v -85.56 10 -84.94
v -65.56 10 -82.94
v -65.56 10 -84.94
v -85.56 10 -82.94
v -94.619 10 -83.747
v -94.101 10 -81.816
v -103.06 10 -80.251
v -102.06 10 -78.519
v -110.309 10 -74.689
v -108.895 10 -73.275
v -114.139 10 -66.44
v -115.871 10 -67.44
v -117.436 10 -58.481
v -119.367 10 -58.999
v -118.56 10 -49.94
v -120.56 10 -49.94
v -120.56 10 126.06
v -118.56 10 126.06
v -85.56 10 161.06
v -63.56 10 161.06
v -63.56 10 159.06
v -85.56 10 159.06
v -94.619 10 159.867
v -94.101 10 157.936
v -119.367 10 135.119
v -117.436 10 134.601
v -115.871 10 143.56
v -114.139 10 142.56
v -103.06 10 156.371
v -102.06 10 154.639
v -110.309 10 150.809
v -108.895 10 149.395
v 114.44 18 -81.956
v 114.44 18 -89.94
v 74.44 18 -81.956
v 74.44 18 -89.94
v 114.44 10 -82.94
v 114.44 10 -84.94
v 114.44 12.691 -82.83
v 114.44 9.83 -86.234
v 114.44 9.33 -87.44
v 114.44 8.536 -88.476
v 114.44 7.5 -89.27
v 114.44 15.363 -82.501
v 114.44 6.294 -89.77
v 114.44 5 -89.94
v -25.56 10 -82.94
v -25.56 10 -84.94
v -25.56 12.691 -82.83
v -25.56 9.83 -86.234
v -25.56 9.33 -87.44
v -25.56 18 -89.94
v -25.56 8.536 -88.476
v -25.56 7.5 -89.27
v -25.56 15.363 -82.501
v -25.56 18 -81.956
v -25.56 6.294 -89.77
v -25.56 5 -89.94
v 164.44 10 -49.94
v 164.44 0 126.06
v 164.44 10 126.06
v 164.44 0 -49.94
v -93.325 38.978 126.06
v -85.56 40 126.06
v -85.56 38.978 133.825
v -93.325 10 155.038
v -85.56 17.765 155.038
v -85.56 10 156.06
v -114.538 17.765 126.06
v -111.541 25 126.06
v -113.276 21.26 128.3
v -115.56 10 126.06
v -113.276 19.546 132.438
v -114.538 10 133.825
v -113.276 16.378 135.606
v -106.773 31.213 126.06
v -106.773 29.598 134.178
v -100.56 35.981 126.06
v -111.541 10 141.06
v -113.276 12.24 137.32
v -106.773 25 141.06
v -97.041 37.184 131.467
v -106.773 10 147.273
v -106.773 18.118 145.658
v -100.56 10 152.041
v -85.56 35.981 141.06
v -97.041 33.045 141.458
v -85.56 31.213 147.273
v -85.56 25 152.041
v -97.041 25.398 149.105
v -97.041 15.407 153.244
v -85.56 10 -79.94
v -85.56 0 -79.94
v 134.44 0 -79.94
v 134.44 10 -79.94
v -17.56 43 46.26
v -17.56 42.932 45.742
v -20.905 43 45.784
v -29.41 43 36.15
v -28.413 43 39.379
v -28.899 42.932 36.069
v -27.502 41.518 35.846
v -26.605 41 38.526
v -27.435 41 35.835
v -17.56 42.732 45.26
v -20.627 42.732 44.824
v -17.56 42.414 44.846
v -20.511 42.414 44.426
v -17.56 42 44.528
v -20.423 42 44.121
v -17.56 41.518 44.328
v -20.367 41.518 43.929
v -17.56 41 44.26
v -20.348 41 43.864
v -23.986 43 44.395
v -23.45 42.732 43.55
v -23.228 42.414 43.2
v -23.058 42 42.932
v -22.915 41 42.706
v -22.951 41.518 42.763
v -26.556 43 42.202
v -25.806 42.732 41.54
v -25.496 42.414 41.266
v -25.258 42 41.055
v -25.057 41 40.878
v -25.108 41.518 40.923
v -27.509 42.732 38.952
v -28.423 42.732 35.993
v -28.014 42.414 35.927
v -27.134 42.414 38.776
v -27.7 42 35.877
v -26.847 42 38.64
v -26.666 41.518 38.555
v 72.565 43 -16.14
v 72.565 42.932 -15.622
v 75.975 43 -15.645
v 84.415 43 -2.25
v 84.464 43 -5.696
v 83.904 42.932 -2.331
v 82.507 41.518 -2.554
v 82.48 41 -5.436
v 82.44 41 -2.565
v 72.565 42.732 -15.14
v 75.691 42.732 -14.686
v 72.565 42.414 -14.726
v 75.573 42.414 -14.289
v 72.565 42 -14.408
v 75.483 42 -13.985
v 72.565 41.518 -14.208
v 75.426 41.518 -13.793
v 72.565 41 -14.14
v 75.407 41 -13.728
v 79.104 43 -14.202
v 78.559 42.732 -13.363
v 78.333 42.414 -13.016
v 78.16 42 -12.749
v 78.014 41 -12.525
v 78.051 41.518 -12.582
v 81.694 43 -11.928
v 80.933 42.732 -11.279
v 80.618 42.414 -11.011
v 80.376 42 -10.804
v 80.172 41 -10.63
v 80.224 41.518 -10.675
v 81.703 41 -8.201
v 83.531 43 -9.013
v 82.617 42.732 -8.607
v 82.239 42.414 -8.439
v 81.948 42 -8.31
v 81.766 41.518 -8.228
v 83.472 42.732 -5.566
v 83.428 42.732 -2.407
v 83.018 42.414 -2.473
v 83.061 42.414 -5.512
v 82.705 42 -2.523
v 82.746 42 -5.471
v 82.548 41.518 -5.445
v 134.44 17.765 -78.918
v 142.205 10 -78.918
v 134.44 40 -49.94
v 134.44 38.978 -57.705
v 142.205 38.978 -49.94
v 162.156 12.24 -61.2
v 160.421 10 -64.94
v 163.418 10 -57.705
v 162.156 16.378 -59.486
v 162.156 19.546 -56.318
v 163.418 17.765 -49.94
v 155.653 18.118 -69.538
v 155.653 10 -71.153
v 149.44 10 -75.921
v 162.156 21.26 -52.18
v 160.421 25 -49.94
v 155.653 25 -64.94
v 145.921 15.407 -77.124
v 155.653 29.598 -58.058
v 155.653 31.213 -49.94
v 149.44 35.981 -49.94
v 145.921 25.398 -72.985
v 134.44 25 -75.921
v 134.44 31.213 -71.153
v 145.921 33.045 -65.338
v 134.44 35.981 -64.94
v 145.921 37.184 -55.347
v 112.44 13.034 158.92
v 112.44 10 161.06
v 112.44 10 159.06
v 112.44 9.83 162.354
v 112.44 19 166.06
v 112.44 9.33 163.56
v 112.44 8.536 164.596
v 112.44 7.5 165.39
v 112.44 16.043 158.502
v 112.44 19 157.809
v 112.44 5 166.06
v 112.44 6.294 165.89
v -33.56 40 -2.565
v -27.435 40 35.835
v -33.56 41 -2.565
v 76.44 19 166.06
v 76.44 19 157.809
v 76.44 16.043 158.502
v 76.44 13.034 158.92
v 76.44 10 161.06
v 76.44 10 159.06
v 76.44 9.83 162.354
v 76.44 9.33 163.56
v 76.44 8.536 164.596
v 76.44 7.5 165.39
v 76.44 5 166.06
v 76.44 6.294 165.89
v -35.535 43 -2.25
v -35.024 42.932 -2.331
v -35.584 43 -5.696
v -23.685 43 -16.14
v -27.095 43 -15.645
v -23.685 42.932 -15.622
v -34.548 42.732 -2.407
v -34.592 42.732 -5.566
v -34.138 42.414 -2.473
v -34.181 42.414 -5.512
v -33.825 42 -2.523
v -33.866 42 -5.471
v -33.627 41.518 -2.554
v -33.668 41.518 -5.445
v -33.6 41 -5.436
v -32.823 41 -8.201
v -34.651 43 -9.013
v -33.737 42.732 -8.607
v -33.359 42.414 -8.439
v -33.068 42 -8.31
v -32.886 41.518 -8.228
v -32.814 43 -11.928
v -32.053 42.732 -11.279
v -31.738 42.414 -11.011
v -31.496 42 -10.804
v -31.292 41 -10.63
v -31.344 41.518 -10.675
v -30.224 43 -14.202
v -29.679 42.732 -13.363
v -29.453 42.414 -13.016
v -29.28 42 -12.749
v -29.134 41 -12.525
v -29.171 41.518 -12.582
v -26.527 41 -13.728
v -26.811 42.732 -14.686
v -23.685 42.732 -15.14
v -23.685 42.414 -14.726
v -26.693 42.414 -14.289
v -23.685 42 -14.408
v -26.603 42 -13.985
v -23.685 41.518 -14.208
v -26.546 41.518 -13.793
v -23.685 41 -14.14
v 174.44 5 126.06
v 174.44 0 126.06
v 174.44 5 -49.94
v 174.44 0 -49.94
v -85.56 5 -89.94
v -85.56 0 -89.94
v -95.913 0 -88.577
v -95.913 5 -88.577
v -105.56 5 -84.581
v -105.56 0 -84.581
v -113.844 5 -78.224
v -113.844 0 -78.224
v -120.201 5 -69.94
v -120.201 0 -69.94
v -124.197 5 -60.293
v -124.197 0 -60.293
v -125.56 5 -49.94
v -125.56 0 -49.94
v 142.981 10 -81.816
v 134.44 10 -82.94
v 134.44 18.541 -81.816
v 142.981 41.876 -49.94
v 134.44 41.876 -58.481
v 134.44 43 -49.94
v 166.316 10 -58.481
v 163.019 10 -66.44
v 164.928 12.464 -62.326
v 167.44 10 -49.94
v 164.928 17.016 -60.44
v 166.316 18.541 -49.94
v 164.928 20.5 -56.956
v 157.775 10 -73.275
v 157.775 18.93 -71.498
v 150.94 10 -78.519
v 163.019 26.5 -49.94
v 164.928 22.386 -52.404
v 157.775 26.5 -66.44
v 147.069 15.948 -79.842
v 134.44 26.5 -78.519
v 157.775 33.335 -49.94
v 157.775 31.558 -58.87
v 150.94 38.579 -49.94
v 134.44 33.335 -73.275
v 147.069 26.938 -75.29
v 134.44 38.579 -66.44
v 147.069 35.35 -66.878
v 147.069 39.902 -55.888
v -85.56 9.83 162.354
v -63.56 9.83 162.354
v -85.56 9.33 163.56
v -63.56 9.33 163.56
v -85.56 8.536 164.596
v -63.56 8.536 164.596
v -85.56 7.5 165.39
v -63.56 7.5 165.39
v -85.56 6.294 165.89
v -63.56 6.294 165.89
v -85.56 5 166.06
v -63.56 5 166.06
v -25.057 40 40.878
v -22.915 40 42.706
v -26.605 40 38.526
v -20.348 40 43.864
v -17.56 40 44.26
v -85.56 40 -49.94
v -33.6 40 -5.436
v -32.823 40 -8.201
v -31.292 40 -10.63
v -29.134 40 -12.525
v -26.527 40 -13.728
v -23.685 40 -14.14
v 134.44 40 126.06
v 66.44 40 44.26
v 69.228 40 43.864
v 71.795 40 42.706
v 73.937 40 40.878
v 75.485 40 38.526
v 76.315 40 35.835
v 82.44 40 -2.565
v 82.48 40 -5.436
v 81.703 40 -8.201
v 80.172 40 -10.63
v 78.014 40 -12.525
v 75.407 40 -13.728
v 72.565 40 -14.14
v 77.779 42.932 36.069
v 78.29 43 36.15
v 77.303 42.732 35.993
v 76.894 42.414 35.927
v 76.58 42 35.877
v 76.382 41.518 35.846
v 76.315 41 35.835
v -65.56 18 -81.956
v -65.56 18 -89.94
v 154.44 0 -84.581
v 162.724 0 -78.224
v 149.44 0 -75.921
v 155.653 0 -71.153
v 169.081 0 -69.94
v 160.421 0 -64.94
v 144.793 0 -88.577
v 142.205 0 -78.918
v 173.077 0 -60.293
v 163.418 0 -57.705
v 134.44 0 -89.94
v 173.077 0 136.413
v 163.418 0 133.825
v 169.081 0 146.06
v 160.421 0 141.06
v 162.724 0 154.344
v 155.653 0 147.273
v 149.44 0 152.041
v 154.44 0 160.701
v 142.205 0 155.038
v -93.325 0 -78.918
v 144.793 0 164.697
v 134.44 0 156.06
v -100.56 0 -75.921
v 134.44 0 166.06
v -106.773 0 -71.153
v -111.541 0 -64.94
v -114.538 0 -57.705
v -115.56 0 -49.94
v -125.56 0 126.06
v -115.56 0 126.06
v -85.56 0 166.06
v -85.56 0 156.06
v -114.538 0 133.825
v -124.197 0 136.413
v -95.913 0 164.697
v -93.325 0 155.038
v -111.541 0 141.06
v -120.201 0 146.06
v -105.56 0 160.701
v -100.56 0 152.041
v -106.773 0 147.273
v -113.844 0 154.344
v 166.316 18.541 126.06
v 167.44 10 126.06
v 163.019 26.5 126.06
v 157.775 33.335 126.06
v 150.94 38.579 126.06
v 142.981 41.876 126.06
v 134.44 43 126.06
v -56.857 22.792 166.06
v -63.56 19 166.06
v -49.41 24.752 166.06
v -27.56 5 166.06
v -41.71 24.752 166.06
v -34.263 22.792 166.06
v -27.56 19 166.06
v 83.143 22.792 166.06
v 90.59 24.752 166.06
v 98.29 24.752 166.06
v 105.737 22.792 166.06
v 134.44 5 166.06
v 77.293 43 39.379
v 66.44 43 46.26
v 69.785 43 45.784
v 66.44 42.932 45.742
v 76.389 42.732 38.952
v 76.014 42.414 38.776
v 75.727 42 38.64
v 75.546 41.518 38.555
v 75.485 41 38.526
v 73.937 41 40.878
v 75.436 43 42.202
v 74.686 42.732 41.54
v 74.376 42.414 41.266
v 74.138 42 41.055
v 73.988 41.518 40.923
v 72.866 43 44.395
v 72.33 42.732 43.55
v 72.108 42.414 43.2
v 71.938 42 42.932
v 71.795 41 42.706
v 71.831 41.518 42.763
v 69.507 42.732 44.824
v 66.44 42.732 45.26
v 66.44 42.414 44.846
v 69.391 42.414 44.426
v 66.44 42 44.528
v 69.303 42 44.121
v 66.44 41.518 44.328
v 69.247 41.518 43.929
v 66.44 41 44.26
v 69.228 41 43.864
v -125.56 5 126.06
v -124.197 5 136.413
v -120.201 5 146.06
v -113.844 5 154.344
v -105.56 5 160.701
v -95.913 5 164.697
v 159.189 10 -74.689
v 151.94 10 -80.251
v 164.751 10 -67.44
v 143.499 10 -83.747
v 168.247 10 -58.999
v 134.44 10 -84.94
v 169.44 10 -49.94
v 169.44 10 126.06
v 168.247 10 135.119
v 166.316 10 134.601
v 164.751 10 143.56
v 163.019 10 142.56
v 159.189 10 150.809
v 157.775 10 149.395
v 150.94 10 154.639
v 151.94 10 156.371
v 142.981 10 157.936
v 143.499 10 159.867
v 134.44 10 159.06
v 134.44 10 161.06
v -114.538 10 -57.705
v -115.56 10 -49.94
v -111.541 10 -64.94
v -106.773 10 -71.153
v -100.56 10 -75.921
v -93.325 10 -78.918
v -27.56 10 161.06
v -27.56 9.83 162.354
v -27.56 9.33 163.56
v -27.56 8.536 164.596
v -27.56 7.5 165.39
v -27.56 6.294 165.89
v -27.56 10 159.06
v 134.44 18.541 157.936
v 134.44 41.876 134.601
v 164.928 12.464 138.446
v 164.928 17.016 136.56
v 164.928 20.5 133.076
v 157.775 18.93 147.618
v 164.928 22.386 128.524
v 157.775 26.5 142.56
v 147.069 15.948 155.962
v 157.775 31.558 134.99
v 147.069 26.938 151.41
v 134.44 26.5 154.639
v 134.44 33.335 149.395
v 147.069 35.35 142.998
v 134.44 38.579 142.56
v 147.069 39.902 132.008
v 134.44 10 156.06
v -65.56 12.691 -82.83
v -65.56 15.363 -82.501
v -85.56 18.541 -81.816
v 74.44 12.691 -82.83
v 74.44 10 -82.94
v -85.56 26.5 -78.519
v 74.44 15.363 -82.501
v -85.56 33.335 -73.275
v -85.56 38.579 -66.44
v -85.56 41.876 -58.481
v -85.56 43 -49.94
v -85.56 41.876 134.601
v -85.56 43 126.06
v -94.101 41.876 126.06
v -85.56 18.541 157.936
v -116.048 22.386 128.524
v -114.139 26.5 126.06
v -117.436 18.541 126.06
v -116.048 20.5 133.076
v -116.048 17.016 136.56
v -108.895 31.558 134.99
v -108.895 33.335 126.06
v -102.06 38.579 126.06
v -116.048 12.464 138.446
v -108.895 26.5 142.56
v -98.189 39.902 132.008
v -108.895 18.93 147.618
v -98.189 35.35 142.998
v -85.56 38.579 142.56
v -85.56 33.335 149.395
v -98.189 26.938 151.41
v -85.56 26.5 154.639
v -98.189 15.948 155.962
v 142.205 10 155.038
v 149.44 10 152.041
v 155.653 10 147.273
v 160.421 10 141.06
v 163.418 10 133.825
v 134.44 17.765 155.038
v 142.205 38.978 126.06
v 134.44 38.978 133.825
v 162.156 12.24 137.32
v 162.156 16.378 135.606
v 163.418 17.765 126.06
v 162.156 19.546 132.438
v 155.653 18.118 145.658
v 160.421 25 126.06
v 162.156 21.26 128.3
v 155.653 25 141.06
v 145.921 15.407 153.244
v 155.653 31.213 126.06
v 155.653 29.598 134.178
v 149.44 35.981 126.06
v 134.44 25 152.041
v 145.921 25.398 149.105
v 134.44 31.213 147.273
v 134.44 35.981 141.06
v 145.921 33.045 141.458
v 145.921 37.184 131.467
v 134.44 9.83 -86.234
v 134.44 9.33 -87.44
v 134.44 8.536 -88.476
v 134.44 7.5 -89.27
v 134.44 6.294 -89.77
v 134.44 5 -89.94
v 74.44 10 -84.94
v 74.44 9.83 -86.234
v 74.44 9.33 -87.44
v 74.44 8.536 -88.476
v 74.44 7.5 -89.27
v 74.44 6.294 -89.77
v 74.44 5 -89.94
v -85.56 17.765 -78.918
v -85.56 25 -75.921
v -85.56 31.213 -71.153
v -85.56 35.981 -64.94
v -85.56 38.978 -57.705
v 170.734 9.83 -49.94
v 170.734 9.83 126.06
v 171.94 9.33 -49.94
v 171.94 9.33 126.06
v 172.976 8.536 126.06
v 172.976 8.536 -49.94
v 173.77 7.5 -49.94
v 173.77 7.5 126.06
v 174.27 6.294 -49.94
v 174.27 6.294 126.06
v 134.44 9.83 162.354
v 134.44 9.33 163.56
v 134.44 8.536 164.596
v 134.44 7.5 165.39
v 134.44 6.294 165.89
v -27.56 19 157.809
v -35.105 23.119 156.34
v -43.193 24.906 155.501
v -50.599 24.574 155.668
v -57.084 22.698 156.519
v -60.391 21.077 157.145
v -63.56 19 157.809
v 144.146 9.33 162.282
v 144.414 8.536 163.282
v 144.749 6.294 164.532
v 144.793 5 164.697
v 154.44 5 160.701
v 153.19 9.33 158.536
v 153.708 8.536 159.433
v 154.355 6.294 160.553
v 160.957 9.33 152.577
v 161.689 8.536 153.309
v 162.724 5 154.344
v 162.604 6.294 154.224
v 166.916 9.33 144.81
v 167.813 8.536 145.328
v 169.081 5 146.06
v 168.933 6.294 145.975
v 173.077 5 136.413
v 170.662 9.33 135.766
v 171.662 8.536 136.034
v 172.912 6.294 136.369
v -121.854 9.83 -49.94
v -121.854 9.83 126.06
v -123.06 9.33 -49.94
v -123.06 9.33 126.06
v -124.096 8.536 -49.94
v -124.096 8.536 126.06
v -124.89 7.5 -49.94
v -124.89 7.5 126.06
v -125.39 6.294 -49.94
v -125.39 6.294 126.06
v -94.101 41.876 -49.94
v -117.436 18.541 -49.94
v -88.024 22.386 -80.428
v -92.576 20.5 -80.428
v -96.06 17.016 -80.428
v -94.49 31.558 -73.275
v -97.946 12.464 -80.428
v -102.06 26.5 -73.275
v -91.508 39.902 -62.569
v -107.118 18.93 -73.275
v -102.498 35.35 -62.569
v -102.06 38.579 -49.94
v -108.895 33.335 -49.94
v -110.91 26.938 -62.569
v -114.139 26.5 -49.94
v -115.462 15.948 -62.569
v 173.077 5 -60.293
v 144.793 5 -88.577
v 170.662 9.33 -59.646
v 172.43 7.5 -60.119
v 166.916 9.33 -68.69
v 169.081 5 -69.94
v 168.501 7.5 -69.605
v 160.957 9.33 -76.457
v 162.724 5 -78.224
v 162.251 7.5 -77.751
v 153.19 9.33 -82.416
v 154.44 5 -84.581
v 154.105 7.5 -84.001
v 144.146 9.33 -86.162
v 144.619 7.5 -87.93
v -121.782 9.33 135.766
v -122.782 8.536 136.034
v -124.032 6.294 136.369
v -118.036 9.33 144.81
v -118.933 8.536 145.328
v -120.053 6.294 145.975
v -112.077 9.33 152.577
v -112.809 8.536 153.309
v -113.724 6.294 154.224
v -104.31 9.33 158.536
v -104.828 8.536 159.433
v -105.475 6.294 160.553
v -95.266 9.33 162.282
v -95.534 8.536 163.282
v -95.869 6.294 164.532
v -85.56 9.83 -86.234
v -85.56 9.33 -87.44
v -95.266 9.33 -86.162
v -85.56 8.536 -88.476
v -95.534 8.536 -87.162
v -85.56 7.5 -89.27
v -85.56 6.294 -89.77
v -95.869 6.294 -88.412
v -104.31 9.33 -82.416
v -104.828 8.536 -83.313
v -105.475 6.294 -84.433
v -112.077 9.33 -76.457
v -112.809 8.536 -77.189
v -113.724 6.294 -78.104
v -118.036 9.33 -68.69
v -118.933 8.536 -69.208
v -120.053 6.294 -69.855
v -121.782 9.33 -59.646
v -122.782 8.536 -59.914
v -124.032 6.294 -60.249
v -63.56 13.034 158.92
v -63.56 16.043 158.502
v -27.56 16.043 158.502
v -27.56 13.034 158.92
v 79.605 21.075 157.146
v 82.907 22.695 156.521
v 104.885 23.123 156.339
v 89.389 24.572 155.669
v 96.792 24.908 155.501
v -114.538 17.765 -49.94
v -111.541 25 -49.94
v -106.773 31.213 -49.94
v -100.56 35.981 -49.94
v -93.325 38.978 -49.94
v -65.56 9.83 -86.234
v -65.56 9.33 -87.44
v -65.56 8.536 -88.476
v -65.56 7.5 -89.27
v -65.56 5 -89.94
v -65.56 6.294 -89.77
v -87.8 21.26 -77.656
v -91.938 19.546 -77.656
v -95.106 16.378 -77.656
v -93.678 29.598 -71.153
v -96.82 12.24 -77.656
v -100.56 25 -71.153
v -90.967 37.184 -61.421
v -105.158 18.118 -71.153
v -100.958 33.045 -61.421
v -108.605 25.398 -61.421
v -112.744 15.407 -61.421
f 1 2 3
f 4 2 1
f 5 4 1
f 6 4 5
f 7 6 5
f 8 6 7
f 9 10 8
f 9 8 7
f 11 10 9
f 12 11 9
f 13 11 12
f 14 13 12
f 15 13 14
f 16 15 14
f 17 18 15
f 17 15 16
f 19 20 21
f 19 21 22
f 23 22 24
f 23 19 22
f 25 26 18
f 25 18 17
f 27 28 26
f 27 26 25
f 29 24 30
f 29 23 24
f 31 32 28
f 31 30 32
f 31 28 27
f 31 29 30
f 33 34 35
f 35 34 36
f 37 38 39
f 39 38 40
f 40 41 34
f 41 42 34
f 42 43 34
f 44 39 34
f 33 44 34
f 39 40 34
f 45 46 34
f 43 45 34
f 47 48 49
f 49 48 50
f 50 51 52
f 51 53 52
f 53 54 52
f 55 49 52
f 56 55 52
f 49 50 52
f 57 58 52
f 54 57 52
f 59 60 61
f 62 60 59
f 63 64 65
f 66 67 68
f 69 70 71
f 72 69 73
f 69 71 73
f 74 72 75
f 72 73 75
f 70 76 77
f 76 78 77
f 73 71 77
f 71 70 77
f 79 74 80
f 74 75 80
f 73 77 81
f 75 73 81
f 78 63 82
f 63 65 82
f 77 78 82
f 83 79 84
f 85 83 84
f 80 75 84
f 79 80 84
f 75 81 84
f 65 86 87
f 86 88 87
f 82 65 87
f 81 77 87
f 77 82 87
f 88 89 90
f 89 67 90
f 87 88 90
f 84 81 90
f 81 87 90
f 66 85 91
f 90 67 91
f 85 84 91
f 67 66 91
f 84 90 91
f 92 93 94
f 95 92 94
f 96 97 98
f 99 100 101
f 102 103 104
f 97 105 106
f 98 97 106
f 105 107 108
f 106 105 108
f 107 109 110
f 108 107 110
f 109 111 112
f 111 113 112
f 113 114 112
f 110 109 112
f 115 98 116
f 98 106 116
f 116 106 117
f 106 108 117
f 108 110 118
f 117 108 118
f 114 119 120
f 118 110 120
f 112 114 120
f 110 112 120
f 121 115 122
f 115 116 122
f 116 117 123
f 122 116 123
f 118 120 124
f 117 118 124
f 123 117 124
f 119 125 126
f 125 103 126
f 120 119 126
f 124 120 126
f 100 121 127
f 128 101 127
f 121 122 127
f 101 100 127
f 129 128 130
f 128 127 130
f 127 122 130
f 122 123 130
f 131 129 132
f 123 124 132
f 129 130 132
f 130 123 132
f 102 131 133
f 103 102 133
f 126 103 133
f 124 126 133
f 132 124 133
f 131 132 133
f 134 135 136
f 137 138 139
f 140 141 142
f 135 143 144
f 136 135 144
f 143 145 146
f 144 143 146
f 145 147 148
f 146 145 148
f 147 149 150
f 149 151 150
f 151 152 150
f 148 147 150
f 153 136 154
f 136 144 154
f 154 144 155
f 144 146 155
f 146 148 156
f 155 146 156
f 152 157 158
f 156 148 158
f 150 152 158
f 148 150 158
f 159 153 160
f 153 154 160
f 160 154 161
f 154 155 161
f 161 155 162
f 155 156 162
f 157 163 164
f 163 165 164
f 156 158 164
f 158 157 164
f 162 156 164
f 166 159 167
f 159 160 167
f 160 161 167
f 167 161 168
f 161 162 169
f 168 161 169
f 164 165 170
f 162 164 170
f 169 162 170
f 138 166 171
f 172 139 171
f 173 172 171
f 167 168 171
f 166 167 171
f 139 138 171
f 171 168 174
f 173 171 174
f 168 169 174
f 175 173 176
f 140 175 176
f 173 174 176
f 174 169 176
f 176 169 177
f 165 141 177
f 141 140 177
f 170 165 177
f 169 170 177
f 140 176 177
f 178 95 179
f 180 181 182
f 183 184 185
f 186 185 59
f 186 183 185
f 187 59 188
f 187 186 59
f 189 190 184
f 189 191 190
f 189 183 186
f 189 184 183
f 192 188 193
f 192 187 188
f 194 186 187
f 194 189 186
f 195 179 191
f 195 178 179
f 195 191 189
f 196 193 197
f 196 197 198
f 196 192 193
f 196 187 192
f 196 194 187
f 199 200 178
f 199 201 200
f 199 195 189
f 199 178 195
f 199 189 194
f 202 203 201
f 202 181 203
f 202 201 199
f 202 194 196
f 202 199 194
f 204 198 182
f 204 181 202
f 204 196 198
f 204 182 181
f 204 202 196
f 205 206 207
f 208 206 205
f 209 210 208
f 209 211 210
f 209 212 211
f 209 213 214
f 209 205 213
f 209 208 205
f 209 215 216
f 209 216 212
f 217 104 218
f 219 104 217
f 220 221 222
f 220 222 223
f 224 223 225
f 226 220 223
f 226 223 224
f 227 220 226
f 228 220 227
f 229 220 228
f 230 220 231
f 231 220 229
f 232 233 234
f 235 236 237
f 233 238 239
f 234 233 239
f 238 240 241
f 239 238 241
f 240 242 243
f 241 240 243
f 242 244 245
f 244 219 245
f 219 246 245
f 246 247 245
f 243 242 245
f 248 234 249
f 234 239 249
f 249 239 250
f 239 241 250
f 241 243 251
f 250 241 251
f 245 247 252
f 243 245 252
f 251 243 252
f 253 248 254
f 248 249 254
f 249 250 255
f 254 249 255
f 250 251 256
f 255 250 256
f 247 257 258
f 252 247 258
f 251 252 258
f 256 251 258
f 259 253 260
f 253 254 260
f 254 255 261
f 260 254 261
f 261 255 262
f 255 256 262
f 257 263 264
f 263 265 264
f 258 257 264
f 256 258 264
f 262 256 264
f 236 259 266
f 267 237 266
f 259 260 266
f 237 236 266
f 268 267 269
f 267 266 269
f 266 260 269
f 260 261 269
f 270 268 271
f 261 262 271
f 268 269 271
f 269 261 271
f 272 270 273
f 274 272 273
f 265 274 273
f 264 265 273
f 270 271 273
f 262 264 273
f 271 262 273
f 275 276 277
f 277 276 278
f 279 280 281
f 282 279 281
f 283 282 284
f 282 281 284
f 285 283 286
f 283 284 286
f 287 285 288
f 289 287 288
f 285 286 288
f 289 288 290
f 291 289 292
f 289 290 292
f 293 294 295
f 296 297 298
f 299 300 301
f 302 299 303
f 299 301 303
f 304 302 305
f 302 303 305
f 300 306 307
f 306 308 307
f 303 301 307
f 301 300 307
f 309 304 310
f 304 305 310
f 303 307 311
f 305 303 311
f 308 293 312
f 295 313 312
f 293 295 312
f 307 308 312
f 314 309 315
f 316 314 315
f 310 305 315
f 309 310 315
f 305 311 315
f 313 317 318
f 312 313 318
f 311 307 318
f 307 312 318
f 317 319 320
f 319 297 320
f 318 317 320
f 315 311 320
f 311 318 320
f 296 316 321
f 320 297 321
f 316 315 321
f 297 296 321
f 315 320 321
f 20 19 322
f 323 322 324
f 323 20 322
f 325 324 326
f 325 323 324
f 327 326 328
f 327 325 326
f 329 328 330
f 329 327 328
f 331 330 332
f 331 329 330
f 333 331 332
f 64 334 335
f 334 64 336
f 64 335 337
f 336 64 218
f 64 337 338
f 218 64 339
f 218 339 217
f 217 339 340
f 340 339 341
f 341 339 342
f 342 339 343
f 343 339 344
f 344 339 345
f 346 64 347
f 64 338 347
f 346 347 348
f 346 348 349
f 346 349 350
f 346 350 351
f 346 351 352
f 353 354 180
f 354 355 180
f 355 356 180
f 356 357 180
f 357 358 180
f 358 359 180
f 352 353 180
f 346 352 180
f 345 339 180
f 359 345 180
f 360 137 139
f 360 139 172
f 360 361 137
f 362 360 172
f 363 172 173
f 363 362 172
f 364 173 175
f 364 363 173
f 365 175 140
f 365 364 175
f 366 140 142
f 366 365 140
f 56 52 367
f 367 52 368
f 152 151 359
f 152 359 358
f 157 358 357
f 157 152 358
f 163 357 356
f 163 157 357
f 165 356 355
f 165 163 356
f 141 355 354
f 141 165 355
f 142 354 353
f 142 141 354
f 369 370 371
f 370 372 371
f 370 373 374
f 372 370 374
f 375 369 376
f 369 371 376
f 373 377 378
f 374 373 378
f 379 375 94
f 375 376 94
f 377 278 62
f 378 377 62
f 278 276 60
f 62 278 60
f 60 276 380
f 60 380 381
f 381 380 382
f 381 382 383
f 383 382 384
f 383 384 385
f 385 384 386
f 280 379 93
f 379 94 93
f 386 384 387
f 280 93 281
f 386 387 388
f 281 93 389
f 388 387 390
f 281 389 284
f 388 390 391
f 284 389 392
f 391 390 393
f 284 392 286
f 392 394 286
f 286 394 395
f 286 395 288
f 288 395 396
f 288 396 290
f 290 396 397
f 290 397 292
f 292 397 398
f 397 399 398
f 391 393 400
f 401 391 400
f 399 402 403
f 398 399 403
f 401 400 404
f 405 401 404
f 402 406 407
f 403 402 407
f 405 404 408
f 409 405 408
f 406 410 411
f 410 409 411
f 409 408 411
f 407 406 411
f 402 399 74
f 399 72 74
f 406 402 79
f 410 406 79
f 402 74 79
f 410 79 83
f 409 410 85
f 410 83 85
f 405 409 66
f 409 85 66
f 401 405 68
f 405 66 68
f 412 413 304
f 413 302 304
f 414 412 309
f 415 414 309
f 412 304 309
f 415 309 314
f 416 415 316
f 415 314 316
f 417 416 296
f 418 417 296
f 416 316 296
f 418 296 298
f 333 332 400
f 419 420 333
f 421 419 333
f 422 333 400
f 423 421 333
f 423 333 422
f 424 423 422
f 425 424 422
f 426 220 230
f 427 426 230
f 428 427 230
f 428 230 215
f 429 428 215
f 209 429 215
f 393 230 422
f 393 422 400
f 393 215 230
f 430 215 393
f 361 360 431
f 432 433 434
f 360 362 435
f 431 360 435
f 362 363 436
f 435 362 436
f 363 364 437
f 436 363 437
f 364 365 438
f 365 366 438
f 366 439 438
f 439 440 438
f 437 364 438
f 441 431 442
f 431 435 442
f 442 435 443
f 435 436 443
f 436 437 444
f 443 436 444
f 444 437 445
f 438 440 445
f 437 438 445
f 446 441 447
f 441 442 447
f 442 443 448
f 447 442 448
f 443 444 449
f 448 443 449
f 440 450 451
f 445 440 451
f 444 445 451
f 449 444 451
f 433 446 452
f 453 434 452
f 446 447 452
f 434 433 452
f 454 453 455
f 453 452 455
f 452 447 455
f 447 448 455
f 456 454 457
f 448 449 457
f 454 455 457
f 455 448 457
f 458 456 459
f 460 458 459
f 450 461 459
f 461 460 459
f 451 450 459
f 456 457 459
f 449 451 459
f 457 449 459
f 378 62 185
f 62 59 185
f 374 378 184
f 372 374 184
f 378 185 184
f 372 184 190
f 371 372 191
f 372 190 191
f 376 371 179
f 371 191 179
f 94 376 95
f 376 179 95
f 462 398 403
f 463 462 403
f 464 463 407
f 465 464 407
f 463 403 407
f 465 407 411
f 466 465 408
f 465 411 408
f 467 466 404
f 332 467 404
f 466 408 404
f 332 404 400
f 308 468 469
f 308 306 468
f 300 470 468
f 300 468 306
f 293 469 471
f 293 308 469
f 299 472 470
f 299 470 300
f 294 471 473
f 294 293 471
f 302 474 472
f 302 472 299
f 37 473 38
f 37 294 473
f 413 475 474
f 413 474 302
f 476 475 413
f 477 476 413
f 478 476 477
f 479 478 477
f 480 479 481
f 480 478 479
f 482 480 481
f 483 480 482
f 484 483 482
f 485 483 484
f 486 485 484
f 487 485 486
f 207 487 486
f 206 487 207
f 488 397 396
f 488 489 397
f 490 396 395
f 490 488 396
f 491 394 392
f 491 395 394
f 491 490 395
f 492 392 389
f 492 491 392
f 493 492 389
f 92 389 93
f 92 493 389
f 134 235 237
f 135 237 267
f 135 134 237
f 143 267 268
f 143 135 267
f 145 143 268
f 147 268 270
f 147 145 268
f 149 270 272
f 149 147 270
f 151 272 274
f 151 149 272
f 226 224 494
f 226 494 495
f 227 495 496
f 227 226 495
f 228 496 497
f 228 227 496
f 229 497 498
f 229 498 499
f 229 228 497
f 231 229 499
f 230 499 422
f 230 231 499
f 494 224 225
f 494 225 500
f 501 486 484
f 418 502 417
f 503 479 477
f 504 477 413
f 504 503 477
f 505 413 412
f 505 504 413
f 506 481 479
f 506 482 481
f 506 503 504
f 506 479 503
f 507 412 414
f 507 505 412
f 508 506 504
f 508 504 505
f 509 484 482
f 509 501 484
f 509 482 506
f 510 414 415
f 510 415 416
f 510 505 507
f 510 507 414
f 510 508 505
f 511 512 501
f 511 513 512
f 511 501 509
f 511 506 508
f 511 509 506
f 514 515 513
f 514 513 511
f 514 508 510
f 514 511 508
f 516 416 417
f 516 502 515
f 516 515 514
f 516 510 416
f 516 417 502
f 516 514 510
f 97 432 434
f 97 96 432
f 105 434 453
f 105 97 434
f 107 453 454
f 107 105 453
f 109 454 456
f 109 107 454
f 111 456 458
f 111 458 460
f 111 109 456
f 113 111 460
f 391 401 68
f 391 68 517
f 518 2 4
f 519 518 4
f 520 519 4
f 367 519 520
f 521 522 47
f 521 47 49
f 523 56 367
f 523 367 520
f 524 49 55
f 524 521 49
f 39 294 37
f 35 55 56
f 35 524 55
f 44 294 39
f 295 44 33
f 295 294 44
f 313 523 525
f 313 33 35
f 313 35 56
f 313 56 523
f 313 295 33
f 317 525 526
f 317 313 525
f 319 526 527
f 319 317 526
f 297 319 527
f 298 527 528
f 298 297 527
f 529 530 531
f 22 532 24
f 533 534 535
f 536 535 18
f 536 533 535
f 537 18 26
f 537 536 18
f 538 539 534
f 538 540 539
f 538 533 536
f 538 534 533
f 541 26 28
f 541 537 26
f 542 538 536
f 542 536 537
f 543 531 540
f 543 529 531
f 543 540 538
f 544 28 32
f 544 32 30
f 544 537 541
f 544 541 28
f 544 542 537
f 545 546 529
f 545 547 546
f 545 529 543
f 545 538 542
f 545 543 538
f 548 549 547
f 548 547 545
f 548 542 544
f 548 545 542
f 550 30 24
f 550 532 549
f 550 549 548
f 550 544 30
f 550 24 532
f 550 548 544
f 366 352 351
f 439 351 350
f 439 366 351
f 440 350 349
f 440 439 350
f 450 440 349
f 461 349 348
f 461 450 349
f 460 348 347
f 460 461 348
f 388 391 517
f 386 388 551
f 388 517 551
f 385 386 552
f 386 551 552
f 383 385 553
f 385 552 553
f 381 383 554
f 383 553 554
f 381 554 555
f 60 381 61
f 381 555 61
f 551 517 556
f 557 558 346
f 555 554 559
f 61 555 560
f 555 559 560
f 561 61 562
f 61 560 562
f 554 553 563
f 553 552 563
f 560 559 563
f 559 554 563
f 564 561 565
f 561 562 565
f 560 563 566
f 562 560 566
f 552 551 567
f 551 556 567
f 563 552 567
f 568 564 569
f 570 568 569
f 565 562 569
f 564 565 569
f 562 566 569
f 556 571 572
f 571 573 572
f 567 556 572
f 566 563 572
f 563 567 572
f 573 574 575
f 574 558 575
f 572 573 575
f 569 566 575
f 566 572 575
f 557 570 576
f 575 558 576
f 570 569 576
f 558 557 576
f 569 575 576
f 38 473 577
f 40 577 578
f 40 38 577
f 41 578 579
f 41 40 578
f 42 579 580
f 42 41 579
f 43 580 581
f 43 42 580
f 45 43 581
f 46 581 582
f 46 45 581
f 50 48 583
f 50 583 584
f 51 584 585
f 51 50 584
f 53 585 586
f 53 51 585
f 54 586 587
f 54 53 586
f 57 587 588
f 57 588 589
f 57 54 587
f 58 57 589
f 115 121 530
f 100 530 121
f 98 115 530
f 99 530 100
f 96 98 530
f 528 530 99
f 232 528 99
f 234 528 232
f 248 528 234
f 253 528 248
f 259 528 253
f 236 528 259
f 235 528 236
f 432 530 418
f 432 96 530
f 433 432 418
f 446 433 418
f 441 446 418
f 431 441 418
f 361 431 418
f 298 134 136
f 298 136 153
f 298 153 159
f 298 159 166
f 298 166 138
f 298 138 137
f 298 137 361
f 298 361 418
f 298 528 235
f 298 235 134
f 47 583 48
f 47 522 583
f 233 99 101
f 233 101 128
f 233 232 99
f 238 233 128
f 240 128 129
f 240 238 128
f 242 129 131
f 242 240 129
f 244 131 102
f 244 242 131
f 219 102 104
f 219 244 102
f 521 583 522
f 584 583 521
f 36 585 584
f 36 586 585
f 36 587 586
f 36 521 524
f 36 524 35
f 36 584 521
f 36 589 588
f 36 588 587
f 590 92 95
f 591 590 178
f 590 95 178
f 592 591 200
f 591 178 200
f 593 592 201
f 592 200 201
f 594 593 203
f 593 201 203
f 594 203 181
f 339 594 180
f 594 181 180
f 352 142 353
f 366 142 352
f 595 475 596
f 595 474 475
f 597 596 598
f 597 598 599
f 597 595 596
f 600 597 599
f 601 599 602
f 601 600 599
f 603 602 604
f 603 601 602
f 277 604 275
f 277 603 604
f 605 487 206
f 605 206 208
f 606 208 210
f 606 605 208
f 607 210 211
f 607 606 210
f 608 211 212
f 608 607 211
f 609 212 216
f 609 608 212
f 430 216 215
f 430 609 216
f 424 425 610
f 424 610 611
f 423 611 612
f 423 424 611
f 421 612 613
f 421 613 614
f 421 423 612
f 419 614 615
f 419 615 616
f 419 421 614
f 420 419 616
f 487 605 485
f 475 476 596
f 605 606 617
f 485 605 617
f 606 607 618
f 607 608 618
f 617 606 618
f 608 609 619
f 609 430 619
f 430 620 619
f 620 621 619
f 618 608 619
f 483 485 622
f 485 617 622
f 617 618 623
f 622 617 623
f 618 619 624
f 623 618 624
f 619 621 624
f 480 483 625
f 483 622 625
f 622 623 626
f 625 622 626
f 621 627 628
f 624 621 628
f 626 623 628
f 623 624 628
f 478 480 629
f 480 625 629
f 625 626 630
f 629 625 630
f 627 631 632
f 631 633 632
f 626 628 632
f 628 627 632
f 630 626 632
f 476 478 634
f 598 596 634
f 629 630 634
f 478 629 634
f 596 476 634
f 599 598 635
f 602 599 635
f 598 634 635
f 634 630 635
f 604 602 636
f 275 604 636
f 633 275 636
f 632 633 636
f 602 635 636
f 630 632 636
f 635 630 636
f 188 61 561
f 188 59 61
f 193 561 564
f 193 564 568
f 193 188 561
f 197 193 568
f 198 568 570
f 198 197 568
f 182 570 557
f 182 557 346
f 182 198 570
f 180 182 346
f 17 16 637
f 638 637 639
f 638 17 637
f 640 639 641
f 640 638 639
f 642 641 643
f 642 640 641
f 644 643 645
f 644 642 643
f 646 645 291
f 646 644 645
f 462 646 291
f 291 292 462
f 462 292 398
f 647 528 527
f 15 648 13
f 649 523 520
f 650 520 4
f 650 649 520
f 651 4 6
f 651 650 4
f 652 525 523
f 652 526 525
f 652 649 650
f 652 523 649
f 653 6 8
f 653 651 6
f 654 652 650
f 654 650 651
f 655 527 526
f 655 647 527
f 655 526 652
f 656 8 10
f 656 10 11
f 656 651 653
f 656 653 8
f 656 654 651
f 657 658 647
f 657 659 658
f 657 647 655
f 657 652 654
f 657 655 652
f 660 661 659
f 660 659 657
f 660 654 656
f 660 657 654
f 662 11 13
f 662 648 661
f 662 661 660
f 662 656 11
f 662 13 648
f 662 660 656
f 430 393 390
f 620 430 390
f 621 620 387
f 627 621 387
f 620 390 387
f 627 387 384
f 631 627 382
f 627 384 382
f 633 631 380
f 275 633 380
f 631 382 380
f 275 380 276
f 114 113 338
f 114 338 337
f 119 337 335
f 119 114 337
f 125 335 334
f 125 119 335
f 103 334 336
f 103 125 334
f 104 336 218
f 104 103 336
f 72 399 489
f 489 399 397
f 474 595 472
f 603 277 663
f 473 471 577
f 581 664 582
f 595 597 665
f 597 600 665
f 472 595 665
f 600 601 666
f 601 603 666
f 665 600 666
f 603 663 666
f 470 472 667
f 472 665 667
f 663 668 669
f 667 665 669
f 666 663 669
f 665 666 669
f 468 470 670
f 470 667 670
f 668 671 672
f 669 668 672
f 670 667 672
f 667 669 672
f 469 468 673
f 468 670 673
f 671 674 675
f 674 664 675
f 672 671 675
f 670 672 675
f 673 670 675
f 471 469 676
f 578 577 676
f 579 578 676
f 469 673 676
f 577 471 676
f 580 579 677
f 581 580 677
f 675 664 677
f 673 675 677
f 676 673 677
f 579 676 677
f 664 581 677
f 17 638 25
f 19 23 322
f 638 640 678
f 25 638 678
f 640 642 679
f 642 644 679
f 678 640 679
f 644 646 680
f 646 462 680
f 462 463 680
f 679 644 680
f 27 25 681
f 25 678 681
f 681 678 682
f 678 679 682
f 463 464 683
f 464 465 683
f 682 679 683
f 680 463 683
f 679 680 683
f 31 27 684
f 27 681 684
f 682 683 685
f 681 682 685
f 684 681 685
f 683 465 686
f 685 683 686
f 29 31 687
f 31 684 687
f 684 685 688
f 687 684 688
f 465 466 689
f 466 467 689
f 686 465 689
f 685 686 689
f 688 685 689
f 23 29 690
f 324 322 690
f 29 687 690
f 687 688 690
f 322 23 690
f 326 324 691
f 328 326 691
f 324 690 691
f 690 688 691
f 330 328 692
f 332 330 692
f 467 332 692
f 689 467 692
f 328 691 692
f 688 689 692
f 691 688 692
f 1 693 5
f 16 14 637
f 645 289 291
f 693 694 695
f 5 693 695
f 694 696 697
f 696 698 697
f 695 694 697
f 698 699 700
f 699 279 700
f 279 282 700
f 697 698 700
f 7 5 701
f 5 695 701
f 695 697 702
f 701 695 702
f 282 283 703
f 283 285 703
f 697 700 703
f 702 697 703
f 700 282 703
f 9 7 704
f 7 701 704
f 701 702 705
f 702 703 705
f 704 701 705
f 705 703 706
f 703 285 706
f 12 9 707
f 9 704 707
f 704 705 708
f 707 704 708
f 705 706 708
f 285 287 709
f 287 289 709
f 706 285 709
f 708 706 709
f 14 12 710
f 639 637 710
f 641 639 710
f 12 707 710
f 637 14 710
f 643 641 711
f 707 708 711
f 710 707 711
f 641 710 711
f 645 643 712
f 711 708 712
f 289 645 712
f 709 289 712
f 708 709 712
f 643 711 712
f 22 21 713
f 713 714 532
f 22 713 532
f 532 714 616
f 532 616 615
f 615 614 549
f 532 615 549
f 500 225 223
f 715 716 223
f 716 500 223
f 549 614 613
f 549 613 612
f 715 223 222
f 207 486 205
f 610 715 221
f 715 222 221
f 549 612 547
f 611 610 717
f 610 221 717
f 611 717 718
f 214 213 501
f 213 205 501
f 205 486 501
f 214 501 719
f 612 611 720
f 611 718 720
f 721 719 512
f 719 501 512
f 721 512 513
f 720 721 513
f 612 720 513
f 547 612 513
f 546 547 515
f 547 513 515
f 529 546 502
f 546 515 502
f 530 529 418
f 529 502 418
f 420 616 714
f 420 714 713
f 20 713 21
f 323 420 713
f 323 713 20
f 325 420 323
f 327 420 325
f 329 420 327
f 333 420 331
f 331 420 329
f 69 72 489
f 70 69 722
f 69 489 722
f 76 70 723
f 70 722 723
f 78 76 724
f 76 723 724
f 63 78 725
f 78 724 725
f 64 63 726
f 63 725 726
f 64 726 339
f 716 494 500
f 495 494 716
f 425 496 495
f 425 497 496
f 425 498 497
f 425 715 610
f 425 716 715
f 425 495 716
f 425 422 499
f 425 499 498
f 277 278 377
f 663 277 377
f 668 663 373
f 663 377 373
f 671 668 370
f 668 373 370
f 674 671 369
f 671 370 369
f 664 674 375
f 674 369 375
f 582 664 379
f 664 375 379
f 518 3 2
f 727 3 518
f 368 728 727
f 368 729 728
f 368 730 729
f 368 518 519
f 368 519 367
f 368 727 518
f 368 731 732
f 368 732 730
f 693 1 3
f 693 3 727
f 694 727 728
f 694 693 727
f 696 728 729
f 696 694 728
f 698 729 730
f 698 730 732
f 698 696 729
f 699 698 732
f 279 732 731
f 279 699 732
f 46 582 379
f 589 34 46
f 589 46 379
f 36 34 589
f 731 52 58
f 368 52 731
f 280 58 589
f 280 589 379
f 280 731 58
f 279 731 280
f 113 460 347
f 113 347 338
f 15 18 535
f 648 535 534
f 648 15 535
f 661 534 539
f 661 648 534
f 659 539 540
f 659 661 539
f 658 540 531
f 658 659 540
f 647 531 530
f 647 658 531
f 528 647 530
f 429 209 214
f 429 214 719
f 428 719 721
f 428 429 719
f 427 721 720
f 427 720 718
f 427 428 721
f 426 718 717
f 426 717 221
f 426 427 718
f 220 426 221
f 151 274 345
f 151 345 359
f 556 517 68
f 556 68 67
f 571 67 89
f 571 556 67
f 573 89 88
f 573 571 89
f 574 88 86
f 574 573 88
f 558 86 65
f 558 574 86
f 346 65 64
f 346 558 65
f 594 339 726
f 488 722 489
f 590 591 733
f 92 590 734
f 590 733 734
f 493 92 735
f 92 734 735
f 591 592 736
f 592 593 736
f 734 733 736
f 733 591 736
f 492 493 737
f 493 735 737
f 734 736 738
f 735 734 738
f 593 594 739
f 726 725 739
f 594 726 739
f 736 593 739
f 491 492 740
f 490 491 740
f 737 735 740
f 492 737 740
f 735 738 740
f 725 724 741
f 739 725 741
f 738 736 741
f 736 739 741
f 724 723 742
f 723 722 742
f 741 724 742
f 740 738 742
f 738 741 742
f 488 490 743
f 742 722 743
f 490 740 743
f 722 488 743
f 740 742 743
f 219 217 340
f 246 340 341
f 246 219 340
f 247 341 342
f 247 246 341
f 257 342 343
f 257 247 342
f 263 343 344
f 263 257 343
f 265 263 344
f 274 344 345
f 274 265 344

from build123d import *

# Parameters (mm, degrees)
SKETCH1_W           = 286
SKETCH1_H           = 242
BOSS_EXTRUDE1_DEPTH = 43
FILLET1_R           = 33
SHELL1_T            = -3
BOSS_EXTRUDE2_DEPTH = 10
FILLET2_R           = 5
CUT_EXTRUDE2_DEPTH  = 245.651256349
FILLET3_R           = 2
BOSS_EXTRUDE3_REACH = 314.753
SKETCH5_W           = 40
SKETCH5_H           = 18
BOSS_EXTRUDE4_REACH = 314.753


with BuildPart() as part:
    # Sketch1 → Boss-Extrude1 (new body)
    with BuildSketch(Plane(origin=(0, 0, 0), x_dir=(1, 0, 0), z_dir=(0, 1, 0))):
        with Locations((24.44, -38.06)):
            Rectangle(SKETCH1_W, SKETCH1_H)
    extrude(amount=BOSS_EXTRUDE1_DEPTH)

    # Fillet1
    fillet1_edges = [part.edges().sort_by_distance(p)[0] for p in [
        (24.44, 43, 159.06),
        (-118.56, 43, 38.06),
        (24.44, 43, -82.94),
        (-118.56, 21.5, -82.94),
        (-118.56, 21.5, 159.06),
        (167.44, 21.5, 159.06),
        (167.44, 21.5, -82.94),
        (167.44, 43, 38.06),
    ]]
    fillet(fillet1_edges, radius=FILLET1_R)

    # Shell1
    shell1_openings = [part.faces().sort_by_distance(p)[0] for p in [
        (24.44, 0, 38.06),
    ]]
    offset(amount=SHELL1_T, openings=shell1_openings, kind=Kind.INTERSECTION)

    # Sketch2 → Boss-Extrude2 (add)
    with BuildSketch(Plane.XZ):
        with BuildLine():
            Line((-85.56, 166.06), (134.44, 166.06))
            ThreePointArc((134.44, 166.06), (162.724271247, 154.344271247), (174.44, 126.06))
            Line((174.44, 126.06), (174.44, -49.94))
            ThreePointArc((174.44, -49.94), (162.724271247, -78.224271247), (134.44, -89.94))
            Line((134.44, -89.94), (-85.56, -89.94))
            ThreePointArc((-85.56, -89.94), (-113.844271247, -78.224271247), (-125.56, -49.94))
            Line((-125.56, -49.94), (-125.56, 126.06))
            ThreePointArc((-125.56, 126.06), (-113.844271247, 154.344271247), (-85.56, 166.06))
        make_face()
        with BuildLine():
            Line((-85.56, 159.06), (134.44, 159.06))
            ThreePointArc((134.44, 159.06), (157.774523779, 149.394523779), (167.44, 126.06))
            Line((167.44, 126.06), (167.44, -49.94))
            ThreePointArc((167.44, -49.94), (157.774523779, -73.274523779), (134.44, -82.94))
            Line((134.44, -82.94), (-85.56, -82.94))
            ThreePointArc((-85.56, -82.94), (-108.894523779, -73.274523779), (-118.56, -49.94))
            Line((-118.56, -49.94), (-118.56, 126.06))
            ThreePointArc((-118.56, 126.06), (-108.894523779, 149.394523779), (-85.56, 159.06))
        make_face(mode=Mode.SUBTRACT)
    extrude(amount=-BOSS_EXTRUDE2_DEPTH)

    # Fillet2
    fillet2_edges = [part.edges().sort_by_distance(p)[0] for p in [
        (162.724271247, 10, -78.224271247),
        (24.44, 10, -89.94),
        (-113.844271247, 10, -78.224271247),
        (-125.56, 10, 38.06),
        (-113.844271247, 10, 154.344271247),
        (24.44, 10, 166.06),
        (162.724271247, 10, 154.344271247),
        (174.44, 10, 38.06),
    ]]
    fillet(fillet2_edges, radius=FILLET2_R)

    # Sketch4 → Cut-Extrude2 (cut, through all)
    with BuildSketch(Plane(origin=(0, 43, 0), x_dir=(1, 0, 0), z_dir=(0, 1, 0))):
        with BuildLine():
            Line((-23.684825583, 14.14), (72.564825583, 14.14))
            ThreePointArc((72.564825583, 14.14), (80.172419453, 10.630340169), (82.44, 2.564903101))
            Line((82.44, 2.564903101), (76.315174417, -35.835096899))
            ThreePointArc((76.315174417, -35.835096899), (72.930340169, -41.86759387), (66.44, -44.26))
            Line((66.44, -44.26), (-17.56, -44.26))
            ThreePointArc((-17.56, -44.26), (-24.050340169, -41.86759387), (-27.435174417, -35.835096899))
            Line((-27.435174417, -35.835096899), (-33.56, 2.564903101))
            ThreePointArc((-33.56, 2.564903101), (-31.292419453, 10.630340169), (-23.684825583, 14.14))
        make_face()
    extrude(amount=-CUT_EXTRUDE2_DEPTH, mode=Mode.SUBTRACT)

    # Fillet3
    fillet3_edges = [part.edges().sort_by_distance(p)[0] for p in [
        (-24.050340169, 43, 41.86759387),
        (24.44, 43, 44.26),
        (72.930340169, 43, 41.86759387),
        (79.377587208, 43, 16.635096899),
        (80.172419453, 43, -10.630340169),
        (24.44, 43, -14.14),
        (-31.292419453, 43, -10.630340169),
        (-30.497587208, 43, 16.635096899),
    ]]
    fillet(fillet3_edges, radius=FILLET3_R)

    # Sketch5 → Boss-Extrude3 (add, up to next)
    with BuildSketch(Plane(origin=(0, 0, -89.94), x_dir=(-1, 0, 0), z_dir=(0, 0, -1)), mode=Mode.PRIVATE) as boss_extrude3_sk1:
        with Locations((-94.44, 9)):
            Rectangle(SKETCH5_W, SKETCH5_H)
    boss_extrude3_tool1 = extrude(boss_extrude3_sk1.sketch, amount=-BOSS_EXTRUDE3_REACH, mode=Mode.PRIVATE) - part.part
    # Sketch5 → Boss-Extrude3 (add, up to next)
    with BuildSketch(Plane(origin=(0, 0, -89.94), x_dir=(-1, 0, 0), z_dir=(0, 0, -1)), mode=Mode.PRIVATE) as boss_extrude3_sk2:
        with Locations((45.56, 9)):
            Rectangle(SKETCH5_W, SKETCH5_H)
    boss_extrude3_tool2 = extrude(boss_extrude3_sk2.sketch, amount=-BOSS_EXTRUDE3_REACH, mode=Mode.PRIVATE) - part.part
    add(boss_extrude3_tool1.solids().sort_by_distance((94.44, 9, -89.94))[0])
    add(boss_extrude3_tool2.solids().sort_by_distance((-45.56, 9, -89.94))[0])

    # Sketch6 → Boss-Extrude4 (add, up to next)
    with BuildSketch(Plane.XY.offset(166.06), mode=Mode.PRIVATE) as boss_extrude4_sk1:
        with BuildLine():
            Line((-63.56, 5), (-27.56, 5))
            Line((-27.56, 5), (-27.56, 19))
            ThreePointArc((-27.56, 19), (-45.56, 25), (-63.56, 19))
            Line((-63.56, 19), (-63.56, 5))
        make_face()
    boss_extrude4_tool1 = extrude(boss_extrude4_sk1.sketch, amount=-BOSS_EXTRUDE4_REACH, mode=Mode.PRIVATE) - part.part
    # Sketch6 → Boss-Extrude4 (add, up to next)
    with BuildSketch(Plane.XY.offset(166.06), mode=Mode.PRIVATE) as boss_extrude4_sk2:
        with BuildLine():
            ThreePointArc((112.44, 19), (94.44, 25), (76.44, 19))
            Line((76.44, 19), (76.44, 5))
            Line((76.44, 5), (112.44, 5))
            Line((112.44, 5), (112.44, 19))
        make_face()
    boss_extrude4_tool2 = extrude(boss_extrude4_sk2.sketch, amount=-BOSS_EXTRUDE4_REACH, mode=Mode.PRIVATE) - part.part
    add(boss_extrude4_tool1.solids().sort_by_distance((-45.56, 14.129204, 166.06))[0])
    add(boss_extrude4_tool2.solids().sort_by_distance((94.44, 14.129204, 166.06))[0])


solid = part.part
